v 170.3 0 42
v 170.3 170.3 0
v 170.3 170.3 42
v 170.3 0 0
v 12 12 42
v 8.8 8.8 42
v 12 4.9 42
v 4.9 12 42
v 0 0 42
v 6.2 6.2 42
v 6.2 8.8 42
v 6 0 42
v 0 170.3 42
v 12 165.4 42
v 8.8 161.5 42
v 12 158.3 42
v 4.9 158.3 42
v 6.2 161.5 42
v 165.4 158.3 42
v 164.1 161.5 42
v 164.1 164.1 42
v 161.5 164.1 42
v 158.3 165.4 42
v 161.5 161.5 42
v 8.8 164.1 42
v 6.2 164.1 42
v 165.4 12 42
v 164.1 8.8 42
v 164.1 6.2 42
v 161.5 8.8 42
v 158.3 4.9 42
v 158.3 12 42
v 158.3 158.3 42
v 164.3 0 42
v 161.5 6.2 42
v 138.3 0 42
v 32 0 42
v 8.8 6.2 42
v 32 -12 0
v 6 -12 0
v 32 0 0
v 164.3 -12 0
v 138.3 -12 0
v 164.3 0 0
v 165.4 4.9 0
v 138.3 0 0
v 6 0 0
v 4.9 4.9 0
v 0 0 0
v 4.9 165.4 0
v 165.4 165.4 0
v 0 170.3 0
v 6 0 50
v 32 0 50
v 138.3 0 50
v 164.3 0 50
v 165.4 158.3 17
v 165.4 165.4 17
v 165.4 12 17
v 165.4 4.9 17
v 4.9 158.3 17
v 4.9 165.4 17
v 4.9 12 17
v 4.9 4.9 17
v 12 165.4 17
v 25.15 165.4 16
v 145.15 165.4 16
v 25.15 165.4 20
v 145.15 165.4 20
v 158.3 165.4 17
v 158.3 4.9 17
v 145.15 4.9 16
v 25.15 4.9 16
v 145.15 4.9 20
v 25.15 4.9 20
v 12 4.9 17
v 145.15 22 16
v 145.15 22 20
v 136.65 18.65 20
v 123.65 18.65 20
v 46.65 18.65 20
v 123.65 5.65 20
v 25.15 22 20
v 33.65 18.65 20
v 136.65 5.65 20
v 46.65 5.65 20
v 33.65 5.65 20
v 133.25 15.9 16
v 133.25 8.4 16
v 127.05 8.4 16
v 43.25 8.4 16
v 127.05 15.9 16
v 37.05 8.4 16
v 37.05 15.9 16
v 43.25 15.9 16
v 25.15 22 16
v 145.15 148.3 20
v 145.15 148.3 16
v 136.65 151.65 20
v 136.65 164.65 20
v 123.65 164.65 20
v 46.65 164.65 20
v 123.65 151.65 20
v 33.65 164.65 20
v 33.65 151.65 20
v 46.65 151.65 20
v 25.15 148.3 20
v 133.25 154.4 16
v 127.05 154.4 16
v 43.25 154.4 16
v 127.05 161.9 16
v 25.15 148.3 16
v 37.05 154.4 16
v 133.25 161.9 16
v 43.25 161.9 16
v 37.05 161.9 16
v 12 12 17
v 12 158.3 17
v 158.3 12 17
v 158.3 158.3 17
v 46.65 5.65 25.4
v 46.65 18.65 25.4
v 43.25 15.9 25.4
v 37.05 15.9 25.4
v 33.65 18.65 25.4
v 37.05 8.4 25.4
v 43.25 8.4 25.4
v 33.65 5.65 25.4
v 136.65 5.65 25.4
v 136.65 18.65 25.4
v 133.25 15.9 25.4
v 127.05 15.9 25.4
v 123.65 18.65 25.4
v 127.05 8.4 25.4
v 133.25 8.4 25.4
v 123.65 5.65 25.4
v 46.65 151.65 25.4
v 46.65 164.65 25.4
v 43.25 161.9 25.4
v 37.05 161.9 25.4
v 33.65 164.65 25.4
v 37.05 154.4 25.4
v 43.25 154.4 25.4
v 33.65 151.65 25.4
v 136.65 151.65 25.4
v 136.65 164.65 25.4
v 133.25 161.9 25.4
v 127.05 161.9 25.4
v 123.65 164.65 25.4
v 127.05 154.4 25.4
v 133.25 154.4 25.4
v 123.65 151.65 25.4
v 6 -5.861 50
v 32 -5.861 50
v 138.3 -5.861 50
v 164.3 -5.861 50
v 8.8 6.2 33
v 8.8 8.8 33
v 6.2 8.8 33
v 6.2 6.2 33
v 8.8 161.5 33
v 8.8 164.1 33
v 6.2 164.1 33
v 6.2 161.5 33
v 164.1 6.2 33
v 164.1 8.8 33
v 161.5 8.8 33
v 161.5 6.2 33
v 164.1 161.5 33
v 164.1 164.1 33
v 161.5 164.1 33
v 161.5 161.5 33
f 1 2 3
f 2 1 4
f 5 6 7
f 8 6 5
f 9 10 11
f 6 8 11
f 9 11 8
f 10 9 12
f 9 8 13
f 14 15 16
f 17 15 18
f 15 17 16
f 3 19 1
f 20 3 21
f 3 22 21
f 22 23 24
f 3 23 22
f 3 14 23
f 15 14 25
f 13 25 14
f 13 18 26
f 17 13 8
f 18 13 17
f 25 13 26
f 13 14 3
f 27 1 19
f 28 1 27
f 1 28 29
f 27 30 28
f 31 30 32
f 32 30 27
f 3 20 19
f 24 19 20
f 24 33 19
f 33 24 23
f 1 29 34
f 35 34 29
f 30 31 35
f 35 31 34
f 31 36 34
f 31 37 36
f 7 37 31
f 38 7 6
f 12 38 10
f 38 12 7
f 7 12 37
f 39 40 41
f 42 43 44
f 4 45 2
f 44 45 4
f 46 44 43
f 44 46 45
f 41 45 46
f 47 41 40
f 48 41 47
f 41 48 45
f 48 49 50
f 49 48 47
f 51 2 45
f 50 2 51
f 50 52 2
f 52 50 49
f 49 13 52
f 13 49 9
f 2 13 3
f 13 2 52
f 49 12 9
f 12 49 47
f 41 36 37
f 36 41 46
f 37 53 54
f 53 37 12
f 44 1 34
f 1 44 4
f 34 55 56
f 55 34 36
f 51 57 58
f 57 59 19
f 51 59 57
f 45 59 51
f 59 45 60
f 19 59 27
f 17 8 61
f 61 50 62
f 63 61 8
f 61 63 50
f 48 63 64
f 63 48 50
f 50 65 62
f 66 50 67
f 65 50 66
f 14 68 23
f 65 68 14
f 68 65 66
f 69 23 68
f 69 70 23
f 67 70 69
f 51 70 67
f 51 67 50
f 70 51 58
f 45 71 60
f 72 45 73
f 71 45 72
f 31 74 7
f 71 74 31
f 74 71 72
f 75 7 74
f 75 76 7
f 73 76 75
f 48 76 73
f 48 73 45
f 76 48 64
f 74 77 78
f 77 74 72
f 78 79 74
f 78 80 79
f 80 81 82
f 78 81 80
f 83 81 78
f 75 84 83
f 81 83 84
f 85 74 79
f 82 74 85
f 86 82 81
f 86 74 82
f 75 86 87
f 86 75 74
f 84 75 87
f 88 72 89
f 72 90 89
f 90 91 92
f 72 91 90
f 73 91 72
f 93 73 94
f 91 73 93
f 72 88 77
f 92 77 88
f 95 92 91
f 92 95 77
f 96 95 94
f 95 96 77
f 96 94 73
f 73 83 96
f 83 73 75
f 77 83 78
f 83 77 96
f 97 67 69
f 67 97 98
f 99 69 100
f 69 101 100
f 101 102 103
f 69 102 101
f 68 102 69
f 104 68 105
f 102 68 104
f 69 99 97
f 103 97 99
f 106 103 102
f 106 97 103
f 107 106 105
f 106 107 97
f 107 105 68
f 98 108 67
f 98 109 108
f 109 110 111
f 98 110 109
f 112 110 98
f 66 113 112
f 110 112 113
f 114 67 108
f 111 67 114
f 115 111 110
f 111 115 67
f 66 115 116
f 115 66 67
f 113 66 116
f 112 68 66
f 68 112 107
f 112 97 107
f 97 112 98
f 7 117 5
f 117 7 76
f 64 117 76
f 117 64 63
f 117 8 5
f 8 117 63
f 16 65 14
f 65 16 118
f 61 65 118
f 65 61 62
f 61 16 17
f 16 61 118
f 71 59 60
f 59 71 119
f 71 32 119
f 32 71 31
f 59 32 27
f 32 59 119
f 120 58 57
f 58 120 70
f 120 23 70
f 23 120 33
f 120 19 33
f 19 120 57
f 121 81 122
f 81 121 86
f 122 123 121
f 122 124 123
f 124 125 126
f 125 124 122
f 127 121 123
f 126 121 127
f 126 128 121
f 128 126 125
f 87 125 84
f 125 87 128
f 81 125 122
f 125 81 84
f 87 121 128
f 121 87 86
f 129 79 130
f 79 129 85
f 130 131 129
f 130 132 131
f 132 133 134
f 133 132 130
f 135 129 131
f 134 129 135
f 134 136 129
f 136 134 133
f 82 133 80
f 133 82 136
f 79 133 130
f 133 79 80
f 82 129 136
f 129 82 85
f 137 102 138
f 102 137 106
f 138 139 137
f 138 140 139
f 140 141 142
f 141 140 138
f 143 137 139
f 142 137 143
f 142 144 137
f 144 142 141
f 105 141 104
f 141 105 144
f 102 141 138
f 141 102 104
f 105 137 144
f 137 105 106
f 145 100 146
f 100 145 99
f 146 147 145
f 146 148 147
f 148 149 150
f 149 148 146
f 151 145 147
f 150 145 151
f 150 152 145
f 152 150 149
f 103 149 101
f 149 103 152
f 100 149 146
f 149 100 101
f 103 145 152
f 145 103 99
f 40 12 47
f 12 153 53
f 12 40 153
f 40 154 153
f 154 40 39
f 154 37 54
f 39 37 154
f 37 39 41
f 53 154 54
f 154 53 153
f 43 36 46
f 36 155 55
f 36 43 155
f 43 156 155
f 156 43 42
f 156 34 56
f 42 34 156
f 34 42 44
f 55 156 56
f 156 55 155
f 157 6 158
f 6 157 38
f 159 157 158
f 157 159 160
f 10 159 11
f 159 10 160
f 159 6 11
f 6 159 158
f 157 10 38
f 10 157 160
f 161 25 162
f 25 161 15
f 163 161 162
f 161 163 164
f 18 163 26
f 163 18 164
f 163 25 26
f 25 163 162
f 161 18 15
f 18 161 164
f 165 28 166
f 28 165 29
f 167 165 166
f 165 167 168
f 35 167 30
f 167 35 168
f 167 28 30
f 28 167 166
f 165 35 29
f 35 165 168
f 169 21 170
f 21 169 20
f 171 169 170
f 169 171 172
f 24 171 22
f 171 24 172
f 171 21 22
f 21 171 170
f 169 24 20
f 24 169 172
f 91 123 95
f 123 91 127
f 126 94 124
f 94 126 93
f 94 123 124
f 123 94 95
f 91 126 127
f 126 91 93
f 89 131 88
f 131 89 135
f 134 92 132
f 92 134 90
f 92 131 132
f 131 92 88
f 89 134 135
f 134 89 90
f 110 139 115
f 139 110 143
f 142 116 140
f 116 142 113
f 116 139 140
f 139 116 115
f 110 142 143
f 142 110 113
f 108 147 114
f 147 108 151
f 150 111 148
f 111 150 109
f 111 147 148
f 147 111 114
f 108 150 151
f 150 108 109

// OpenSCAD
// Generated from model.py. Current front frame with integrated stand.
module front_frame() {
  multmatrix([[1,0,0,0],[0,1,0,0],[0,0,1,0],[0,0,0,1]])
    difference() {
      union() {
        difference() { union() { translate([0, 0, 0]) cube([170.3, 170.3, 42.0]); } union() { translate([4.9, 4.9, -1]) cube([160.5, 160.5, 44.0]); } }
        translate([25.150000000000006, 0, 16.0]) cube([120.0, 22, 4.0]);
translate([25.150000000000006, 148.3, 16.0]) cube([120.0, 22.0, 4.0]);
translate([4, 4, 17.0]) cube([8, 8, 25.0]);
translate([4, 158.3, 17.0]) cube([8, 8.0, 25.0]);
translate([158.3, 4, 17.0]) cube([8.0, 8, 25.0]);
translate([158.3, 158.3, 17.0]) cube([8.0, 8.0, 25.0]);
translate([33.650000000000006, 5.650000000000006, 20.0]) cube([13.0, 13.0, 5.4]);
translate([123.65, 5.650000000000006, 20.0]) cube([13.0, 13.0, 5.4]);
translate([33.650000000000006, 151.65, 20.0]) cube([13.0, 13.0, 5.4]);
translate([123.65, 151.65, 20.0]) cube([13.0, 13.0, 5.4]);
polyhedron(points=[[6, -12.0, 0], [6, 0, 0], [6, 0, 50.0], [6, -5.86077195485477, 50.0], [32, -12.0, 0], [32, 0, 0], [32, 0, 50.0], [32, -5.86077195485477, 50.0]], faces=[[0, 1, 2, 3], [7, 6, 5, 4], [4, 5, 1, 0], [5, 6, 2, 1], [6, 7, 3, 2], [7, 4, 0, 3]]);
polyhedron(points=[[138.3, -12.0, 0], [138.3, 0, 0], [138.3, 0, 50.0], [138.3, -5.86077195485477, 50.0], [164.3, -12.0, 0], [164.3, 0, 0], [164.3, 0, 50.0], [164.3, -5.86077195485477, 50.0]], faces=[[0, 1, 2, 3], [7, 6, 5, 4], [4, 5, 1, 0], [5, 6, 2, 1], [6, 7, 3, 2], [7, 4, 0, 3]]);
      }
      union() { translate([6.2, 6.2, 33.0]) cube([2.6, 2.6, 10.0]);
translate([6.2, 161.5, 33.0]) cube([2.6, 2.6, 10.0]);
translate([161.5, 6.2, 33.0]) cube([2.6, 2.6, 10.0]);
translate([161.5, 161.5, 33.0]) cube([2.6, 2.6, 10.0]);
translate([37.050000000000004, 8.400000000000006, 15.0]) cube([6.2, 7.5, 11.4]);
translate([127.05000000000001, 8.400000000000006, 15.0]) cube([6.2, 7.5, 11.4]);
translate([37.050000000000004, 154.4, 15.0]) cube([6.2, 7.5, 11.4]);
translate([127.05000000000001, 154.4, 15.0]) cube([6.2, 7.5, 11.4]); }
    }
}
front_frame();
